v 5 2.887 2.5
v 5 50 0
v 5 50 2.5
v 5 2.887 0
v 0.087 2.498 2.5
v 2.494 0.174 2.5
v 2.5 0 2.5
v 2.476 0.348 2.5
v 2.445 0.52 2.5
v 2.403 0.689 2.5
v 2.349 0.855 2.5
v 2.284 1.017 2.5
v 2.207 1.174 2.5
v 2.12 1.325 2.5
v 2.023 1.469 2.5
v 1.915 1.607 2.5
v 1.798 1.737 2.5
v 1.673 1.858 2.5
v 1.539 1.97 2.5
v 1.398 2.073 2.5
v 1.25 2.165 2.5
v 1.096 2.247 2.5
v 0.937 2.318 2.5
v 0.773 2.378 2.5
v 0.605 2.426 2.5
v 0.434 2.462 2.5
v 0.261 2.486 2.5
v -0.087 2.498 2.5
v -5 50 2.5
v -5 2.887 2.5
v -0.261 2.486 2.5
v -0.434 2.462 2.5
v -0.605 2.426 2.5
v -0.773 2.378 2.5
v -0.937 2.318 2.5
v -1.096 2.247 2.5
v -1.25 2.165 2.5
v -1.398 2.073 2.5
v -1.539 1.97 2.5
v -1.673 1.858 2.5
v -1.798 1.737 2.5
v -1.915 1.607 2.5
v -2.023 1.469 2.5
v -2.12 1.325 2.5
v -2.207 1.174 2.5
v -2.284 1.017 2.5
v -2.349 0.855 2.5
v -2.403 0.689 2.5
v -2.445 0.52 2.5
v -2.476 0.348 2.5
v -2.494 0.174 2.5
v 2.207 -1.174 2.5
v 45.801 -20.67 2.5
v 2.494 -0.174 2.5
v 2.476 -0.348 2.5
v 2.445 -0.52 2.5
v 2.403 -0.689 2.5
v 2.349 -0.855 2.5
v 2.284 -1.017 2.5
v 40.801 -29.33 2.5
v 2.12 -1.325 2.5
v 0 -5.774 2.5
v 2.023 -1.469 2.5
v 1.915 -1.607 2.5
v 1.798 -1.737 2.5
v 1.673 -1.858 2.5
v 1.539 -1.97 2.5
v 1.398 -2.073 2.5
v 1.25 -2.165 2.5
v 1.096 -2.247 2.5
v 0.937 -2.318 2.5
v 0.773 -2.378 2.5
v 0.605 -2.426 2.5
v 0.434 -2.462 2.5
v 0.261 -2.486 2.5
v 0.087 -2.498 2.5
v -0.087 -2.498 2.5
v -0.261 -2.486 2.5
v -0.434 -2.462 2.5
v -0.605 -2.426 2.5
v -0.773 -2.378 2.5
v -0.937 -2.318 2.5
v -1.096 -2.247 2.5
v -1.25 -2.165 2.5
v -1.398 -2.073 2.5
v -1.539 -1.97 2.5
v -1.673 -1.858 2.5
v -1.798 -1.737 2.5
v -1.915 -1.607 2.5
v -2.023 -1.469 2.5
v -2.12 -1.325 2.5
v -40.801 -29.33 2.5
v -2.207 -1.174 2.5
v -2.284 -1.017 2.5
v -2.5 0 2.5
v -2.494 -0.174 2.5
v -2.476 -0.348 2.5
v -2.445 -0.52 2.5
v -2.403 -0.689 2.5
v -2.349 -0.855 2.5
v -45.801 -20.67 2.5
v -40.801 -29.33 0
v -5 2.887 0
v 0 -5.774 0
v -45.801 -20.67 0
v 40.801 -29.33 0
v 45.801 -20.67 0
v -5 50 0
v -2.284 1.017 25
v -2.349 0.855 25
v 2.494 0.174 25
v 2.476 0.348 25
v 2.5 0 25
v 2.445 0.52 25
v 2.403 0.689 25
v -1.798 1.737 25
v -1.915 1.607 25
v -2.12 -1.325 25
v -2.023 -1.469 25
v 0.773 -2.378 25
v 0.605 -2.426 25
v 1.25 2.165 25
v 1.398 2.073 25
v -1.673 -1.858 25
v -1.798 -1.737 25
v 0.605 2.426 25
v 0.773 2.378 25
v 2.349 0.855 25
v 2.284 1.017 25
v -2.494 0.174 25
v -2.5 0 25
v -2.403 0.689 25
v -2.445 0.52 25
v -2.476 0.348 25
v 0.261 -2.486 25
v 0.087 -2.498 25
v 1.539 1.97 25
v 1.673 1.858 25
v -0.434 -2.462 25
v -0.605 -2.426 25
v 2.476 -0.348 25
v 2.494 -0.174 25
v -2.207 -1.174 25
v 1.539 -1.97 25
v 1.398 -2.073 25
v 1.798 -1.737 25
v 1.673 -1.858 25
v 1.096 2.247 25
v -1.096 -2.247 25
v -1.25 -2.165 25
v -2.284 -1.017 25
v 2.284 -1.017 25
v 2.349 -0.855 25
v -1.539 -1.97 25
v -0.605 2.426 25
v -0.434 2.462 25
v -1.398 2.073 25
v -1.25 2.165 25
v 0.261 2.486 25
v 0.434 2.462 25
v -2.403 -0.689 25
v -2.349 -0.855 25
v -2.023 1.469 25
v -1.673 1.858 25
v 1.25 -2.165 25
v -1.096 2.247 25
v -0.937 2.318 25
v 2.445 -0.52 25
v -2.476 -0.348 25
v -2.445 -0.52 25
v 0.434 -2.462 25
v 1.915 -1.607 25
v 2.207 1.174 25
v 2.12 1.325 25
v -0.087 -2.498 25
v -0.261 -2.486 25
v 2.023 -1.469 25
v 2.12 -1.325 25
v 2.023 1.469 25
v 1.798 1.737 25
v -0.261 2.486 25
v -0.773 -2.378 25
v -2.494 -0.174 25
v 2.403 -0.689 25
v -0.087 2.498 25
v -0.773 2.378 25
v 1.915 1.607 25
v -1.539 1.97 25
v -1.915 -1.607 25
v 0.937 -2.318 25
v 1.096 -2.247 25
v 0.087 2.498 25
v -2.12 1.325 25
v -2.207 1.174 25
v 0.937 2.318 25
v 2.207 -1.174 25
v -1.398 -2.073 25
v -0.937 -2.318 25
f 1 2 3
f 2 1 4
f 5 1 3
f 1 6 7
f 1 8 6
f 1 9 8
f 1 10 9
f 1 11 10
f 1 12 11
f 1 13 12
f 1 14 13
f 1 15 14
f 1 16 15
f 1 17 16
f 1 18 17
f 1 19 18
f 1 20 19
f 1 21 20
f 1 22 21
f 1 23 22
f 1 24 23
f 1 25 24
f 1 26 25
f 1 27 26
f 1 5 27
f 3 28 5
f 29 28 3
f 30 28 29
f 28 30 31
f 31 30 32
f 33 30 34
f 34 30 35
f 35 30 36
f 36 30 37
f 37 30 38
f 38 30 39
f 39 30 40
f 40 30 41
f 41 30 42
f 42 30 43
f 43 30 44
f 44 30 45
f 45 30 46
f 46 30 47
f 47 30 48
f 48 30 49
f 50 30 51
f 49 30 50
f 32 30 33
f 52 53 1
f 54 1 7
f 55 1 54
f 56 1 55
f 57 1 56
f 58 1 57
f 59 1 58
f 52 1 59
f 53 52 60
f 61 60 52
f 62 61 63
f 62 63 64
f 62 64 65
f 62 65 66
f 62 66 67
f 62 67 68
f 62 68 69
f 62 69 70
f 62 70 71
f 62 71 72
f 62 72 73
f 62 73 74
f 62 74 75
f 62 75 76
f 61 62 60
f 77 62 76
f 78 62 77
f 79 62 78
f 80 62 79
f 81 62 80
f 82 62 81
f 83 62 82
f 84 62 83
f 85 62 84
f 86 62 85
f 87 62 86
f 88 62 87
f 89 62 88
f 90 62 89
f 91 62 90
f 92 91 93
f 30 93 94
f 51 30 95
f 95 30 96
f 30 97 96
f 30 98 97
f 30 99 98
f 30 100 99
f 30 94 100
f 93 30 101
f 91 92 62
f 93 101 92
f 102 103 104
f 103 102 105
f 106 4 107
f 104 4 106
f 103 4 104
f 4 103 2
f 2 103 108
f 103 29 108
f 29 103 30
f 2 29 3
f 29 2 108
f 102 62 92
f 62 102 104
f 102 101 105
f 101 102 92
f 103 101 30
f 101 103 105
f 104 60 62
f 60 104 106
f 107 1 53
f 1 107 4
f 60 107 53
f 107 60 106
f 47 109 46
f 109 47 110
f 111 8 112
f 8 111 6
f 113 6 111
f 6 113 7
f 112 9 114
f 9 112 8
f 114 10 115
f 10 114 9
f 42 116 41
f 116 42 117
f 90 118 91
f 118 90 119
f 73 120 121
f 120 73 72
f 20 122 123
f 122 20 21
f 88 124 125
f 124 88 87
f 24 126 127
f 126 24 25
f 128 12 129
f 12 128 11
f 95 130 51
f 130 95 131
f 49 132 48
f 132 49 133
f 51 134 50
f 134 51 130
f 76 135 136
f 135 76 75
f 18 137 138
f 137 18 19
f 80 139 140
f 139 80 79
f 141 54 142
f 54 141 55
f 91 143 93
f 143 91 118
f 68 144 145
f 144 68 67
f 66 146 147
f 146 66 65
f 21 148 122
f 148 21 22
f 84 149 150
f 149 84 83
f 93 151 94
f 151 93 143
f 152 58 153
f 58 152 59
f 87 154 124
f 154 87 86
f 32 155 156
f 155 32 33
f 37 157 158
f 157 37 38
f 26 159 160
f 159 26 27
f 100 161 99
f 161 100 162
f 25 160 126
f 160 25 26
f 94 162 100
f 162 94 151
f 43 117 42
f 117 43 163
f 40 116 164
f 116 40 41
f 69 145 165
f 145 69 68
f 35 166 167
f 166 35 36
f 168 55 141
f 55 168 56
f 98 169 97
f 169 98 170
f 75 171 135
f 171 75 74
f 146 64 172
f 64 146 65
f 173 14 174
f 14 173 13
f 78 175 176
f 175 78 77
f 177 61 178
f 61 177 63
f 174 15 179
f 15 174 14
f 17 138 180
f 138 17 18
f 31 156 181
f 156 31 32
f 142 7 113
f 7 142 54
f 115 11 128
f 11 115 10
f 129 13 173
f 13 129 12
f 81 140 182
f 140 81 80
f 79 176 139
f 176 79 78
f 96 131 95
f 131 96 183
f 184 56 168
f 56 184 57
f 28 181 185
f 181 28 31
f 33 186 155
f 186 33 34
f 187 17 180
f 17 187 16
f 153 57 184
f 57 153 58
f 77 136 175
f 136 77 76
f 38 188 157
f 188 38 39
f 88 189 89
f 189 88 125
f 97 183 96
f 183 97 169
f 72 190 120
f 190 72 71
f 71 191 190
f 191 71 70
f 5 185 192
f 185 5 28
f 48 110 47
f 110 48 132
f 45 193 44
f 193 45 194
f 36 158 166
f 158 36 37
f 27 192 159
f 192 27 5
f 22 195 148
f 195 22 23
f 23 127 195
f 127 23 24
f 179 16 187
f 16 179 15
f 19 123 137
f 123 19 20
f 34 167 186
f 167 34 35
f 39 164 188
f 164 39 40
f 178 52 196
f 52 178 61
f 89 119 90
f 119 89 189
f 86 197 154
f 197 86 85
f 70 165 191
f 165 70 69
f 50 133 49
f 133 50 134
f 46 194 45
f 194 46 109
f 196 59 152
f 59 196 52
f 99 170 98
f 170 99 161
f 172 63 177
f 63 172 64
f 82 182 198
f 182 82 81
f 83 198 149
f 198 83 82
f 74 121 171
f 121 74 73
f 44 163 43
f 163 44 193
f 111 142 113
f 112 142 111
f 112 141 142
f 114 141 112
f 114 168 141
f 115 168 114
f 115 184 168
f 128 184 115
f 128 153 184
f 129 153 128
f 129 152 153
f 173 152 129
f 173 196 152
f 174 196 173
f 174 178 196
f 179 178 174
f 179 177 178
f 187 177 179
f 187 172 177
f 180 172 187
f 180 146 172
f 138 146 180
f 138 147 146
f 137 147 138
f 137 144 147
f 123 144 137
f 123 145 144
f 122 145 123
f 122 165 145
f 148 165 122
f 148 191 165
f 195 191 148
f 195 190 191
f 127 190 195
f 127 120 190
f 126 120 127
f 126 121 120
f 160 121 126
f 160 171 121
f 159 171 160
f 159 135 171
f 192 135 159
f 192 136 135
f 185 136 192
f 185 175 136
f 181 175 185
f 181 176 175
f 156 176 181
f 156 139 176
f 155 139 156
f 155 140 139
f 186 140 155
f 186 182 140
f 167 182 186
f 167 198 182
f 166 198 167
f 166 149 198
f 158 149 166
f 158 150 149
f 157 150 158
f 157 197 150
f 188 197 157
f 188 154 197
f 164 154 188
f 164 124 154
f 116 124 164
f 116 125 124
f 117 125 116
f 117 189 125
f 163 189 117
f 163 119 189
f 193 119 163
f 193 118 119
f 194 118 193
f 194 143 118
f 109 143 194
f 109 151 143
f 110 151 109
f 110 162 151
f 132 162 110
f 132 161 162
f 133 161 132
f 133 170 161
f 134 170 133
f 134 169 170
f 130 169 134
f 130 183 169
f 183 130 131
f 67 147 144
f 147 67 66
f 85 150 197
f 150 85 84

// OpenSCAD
$fa=4; // default minimum facet angle is now 0.5
$fs=0.05; // default minimum facet size is now 0.05 mm

divisionWidth = 10;

translate([(divisionWidth / -2), 0, 0]) cube([divisionWidth, 50, 2.5]);
rotate([0, 0, 120]) translate([(divisionWidth / -2), 0, 0]) cube([divisionWidth, 50, 2.5]);
rotate([0, 0, 240]) translate([(divisionWidth / -2), 0, 0]) cube([divisionWidth, 50, 2.5]);
cylinder(h=25, r=divisionWidth / 4);
